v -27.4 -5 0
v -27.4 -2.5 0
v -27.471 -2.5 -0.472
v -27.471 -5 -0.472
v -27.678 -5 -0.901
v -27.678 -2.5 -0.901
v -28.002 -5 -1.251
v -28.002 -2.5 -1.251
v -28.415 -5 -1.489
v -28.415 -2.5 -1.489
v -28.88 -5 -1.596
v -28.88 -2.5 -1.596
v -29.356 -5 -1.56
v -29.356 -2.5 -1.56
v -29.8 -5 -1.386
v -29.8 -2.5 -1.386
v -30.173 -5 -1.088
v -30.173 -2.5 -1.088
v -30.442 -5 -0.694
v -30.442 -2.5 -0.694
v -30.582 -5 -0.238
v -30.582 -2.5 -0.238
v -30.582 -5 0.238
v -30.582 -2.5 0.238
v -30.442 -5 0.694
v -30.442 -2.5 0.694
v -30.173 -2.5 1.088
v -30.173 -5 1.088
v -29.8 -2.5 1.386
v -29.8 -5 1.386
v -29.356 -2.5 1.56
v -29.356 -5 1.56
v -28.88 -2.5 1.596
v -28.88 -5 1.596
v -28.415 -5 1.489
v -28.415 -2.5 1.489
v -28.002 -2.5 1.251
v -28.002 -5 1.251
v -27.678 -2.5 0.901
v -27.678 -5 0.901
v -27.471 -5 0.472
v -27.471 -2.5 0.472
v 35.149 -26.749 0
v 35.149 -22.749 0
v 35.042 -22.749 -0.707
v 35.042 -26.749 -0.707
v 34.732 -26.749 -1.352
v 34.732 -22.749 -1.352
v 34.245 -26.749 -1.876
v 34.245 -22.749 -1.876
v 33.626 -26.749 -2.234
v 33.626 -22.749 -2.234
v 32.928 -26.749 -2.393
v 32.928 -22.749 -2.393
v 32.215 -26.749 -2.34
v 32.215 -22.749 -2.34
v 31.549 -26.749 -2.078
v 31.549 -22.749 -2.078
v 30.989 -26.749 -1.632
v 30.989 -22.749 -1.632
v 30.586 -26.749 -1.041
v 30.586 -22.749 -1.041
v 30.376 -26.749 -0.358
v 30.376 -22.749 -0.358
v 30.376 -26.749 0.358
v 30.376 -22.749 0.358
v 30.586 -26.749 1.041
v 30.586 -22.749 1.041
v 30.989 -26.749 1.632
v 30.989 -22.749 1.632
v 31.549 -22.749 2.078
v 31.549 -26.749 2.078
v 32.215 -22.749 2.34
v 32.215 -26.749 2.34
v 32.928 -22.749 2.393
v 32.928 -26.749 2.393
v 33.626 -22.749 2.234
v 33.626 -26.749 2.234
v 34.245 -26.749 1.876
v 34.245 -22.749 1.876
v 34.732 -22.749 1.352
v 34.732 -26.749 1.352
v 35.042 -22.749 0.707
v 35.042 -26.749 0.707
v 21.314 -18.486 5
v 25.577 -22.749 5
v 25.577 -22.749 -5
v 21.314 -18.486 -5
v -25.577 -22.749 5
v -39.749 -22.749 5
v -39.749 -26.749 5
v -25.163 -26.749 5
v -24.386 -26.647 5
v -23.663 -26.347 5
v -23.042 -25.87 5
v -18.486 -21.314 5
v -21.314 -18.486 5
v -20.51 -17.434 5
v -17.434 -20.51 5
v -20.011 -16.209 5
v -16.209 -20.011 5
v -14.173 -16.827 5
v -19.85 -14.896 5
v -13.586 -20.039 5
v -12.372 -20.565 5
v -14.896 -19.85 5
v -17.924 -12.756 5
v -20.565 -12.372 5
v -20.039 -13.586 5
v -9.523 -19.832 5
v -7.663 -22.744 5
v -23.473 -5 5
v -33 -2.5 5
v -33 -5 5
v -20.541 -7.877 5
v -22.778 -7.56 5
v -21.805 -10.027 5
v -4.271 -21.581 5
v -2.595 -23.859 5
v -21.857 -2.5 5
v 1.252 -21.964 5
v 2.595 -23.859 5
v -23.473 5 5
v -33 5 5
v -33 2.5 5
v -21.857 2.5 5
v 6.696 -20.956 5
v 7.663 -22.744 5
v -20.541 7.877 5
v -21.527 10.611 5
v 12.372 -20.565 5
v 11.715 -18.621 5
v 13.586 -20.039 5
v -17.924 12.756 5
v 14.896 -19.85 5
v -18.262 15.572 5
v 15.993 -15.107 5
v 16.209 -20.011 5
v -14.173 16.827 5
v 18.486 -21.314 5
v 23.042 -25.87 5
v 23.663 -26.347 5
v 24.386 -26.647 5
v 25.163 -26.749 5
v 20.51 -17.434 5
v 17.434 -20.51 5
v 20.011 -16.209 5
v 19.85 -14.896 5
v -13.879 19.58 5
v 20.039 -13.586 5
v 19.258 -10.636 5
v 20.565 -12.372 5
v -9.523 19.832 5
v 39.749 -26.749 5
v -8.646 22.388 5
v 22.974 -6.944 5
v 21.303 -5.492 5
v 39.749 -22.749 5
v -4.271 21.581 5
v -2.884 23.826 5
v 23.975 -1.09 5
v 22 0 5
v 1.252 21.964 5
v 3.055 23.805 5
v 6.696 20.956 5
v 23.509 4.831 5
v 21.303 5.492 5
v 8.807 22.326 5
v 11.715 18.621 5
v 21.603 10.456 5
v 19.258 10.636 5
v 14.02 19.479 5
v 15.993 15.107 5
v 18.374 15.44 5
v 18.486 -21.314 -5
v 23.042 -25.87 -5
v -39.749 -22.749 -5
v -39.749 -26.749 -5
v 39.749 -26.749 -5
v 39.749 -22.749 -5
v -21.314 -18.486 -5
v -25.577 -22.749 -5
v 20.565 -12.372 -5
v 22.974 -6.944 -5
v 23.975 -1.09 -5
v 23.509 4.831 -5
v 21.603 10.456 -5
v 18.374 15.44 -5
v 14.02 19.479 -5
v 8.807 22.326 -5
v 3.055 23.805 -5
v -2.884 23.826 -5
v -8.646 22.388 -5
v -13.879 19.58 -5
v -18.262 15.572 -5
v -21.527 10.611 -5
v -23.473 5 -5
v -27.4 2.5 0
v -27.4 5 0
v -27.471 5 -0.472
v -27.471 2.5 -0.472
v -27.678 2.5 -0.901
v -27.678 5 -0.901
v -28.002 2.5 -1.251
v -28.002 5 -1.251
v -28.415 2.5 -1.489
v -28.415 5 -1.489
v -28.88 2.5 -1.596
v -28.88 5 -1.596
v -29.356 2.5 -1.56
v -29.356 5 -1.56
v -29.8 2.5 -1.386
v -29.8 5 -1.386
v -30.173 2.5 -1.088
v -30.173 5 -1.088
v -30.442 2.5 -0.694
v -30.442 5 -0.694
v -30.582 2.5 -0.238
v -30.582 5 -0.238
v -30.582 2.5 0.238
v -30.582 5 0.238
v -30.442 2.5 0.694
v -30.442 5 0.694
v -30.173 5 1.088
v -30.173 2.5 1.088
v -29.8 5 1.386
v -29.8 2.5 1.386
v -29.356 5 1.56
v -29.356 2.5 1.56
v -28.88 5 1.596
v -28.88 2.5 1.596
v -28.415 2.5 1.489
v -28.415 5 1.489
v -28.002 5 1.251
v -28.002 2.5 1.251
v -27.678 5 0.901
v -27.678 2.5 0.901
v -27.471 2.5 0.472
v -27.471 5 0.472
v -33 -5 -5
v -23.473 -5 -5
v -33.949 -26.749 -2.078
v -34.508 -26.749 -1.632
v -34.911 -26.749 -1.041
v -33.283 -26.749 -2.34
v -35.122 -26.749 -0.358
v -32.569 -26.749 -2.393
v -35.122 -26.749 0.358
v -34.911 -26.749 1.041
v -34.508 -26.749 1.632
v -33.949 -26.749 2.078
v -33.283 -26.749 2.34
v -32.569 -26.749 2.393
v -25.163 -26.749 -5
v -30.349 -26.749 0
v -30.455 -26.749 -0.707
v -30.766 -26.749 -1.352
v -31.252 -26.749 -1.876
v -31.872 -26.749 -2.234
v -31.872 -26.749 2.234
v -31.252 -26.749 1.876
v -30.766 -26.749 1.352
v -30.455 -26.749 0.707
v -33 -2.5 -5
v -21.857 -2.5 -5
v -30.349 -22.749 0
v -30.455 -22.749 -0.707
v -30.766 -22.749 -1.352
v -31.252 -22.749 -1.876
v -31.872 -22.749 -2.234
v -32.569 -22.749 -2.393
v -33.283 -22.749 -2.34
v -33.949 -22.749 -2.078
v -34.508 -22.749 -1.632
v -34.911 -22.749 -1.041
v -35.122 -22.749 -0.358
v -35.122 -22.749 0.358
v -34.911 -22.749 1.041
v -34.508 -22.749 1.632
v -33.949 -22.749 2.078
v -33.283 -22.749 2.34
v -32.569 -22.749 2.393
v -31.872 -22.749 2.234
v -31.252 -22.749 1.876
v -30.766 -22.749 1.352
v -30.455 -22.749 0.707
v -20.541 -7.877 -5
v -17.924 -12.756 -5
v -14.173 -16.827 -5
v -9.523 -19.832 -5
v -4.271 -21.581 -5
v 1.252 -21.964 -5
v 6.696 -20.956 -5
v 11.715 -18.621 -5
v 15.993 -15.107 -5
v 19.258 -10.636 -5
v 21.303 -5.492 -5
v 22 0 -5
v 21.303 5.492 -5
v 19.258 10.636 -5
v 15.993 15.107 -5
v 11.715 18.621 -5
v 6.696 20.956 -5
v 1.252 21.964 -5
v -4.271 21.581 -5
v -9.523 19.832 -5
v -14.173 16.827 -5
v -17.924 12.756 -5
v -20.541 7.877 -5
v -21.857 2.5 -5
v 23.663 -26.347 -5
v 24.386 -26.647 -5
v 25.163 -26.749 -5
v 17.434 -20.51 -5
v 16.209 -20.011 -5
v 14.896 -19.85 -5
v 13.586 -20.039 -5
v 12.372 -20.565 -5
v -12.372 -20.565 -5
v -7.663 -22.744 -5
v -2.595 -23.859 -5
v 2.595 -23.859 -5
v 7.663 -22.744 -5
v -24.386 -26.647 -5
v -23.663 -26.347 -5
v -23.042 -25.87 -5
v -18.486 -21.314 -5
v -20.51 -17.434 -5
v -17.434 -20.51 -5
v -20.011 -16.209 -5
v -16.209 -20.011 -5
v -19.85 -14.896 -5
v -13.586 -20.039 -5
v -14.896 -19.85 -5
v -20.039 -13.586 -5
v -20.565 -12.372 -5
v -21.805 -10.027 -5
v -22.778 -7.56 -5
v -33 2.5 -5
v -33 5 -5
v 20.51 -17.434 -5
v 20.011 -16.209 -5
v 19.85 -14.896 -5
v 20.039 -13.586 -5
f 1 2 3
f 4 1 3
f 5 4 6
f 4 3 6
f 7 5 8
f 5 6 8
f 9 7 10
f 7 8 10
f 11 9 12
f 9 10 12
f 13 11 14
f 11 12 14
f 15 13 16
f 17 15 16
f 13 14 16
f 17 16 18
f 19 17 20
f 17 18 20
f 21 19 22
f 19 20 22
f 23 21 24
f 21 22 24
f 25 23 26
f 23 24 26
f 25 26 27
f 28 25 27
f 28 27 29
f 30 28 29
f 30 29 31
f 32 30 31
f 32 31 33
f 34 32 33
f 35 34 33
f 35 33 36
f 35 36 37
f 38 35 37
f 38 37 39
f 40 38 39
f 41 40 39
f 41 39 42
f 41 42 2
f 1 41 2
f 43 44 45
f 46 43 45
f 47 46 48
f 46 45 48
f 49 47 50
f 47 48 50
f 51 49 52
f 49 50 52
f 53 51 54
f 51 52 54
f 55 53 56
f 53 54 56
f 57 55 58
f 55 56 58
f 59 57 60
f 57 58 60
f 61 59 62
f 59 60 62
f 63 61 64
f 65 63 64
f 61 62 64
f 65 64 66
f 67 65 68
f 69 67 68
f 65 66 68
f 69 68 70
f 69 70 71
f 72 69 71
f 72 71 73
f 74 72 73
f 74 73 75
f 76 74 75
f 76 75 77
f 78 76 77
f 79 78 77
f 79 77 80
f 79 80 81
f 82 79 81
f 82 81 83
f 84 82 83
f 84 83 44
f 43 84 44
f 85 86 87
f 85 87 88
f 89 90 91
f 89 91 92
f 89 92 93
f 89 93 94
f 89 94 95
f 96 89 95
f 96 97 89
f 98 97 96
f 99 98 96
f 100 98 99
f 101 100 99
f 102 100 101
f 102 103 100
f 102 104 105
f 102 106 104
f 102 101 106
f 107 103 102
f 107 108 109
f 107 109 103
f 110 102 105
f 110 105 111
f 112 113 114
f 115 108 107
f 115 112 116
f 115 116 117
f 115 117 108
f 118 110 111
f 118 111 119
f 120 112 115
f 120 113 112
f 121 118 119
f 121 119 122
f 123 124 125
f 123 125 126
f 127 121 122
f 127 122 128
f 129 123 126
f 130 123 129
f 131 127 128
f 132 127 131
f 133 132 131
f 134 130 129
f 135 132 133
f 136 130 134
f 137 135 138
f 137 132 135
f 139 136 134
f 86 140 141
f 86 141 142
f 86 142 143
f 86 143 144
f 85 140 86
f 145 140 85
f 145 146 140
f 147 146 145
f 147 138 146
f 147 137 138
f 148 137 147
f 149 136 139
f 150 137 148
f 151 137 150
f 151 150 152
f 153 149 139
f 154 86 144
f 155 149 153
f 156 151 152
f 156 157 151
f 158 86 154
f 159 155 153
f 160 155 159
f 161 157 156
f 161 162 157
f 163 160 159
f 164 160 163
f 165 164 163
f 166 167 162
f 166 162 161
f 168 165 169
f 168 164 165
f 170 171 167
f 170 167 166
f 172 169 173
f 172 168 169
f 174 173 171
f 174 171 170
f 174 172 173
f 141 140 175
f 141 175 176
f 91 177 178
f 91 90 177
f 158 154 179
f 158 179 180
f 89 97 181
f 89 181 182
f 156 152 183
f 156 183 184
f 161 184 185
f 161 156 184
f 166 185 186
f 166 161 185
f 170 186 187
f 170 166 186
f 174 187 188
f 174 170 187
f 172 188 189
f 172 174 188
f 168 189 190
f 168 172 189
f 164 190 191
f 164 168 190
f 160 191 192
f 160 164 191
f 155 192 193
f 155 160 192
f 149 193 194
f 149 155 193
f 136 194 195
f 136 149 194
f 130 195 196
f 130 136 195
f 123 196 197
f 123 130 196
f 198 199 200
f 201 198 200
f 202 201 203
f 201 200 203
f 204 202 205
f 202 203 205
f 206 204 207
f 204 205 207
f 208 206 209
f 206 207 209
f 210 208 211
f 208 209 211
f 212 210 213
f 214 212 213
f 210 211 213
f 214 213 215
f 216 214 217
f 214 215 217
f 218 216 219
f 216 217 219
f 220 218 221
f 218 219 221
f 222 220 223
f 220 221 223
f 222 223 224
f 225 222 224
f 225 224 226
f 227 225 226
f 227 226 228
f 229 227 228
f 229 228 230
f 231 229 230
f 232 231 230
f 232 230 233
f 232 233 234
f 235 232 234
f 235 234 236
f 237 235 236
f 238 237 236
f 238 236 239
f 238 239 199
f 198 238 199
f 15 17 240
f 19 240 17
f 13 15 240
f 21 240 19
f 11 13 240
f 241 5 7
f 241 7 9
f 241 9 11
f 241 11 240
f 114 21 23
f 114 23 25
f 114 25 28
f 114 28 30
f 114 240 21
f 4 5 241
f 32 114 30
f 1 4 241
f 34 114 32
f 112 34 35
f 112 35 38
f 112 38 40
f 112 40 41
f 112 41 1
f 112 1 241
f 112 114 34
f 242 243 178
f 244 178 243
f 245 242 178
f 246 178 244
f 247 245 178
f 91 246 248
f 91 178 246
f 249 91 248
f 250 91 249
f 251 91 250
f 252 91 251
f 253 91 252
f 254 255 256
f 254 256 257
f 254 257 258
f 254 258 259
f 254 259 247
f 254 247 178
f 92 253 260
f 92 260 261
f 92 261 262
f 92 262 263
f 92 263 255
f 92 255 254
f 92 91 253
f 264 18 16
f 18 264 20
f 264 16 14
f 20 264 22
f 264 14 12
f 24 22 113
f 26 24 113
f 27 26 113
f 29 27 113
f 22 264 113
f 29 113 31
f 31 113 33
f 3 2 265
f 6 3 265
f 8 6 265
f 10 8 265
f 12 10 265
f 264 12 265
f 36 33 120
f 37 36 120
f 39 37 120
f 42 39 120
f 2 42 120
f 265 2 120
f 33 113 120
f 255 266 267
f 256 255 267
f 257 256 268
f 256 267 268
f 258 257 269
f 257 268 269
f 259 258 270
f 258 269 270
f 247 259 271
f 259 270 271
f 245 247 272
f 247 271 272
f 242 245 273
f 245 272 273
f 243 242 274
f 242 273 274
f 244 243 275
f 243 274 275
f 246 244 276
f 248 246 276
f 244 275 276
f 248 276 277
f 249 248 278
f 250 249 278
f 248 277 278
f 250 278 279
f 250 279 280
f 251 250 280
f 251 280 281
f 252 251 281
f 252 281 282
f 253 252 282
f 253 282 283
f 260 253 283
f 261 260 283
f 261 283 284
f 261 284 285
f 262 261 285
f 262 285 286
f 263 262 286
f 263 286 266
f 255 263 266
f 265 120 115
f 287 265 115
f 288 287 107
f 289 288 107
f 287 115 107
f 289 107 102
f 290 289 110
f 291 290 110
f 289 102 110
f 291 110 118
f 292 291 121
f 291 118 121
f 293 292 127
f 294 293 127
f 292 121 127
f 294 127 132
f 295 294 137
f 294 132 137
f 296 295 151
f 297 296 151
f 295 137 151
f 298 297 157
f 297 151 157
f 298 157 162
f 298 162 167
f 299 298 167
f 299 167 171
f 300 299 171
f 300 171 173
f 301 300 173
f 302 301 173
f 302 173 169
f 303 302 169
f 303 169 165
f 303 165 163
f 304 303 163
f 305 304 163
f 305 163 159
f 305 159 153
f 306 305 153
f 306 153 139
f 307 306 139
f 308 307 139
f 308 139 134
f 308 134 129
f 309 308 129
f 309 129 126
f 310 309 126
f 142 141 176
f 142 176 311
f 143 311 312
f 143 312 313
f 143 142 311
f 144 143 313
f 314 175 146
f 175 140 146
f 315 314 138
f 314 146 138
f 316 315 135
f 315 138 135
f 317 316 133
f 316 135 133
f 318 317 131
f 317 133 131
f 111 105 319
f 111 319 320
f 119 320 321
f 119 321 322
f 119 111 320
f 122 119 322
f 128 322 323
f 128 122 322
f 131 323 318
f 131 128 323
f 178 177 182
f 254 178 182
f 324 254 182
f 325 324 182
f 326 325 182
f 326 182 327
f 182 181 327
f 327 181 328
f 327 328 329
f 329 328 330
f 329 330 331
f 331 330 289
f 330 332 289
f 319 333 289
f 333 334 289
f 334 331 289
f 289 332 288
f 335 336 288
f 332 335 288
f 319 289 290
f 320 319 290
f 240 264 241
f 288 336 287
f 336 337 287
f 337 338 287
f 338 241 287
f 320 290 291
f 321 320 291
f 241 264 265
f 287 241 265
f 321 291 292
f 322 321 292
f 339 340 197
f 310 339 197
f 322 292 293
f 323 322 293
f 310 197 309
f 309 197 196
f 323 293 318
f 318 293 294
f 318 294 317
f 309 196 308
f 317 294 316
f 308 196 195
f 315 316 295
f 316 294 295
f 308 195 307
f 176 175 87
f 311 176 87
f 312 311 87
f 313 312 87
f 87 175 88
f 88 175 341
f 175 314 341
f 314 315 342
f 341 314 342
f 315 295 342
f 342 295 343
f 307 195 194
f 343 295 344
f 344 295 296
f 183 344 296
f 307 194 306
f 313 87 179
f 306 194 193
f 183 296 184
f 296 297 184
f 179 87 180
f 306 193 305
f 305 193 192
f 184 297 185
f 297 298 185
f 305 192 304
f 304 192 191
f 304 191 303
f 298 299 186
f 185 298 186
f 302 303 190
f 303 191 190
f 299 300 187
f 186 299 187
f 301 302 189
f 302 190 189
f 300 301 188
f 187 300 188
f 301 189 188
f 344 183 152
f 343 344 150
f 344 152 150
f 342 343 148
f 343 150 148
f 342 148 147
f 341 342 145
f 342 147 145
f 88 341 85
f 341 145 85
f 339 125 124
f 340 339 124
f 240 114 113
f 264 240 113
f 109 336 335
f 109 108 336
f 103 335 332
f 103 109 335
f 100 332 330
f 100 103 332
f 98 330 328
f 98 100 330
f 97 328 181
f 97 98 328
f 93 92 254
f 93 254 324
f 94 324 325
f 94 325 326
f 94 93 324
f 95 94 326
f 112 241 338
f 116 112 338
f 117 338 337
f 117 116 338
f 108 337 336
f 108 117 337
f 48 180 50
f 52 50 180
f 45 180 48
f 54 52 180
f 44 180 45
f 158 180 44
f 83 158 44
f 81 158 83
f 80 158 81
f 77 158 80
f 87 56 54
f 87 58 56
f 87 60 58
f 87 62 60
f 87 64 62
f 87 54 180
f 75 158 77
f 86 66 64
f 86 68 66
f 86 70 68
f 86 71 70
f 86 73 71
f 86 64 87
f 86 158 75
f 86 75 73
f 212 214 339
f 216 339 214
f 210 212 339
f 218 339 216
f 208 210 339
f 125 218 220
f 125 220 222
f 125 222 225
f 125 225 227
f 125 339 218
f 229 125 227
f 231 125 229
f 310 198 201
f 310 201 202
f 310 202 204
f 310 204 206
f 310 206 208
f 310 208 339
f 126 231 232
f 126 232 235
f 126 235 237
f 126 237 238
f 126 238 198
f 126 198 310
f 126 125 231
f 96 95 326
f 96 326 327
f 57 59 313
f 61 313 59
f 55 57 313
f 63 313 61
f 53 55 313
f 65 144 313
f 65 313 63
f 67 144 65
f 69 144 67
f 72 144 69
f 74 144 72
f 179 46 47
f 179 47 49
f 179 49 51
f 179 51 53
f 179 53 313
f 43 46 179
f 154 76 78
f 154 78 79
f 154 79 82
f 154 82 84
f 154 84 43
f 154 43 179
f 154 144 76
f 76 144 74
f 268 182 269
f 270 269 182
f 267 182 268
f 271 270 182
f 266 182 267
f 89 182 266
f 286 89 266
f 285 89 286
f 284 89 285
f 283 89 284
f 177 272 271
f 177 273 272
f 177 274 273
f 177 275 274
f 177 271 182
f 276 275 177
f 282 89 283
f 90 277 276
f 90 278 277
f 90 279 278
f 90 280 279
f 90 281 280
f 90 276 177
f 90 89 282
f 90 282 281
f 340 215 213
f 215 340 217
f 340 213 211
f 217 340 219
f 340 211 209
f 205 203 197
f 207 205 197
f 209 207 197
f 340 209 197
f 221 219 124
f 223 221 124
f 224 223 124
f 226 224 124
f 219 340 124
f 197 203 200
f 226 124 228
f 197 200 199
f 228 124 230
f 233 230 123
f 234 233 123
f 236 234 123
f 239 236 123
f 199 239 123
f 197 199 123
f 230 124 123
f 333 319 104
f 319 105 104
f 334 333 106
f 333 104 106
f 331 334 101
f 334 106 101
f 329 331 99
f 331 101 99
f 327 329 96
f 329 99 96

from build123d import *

# Parameters (mm, degrees)
SKETCH1_R               = 24
BOSS_EXTRUDE1_DEPTH     = 5
EXTRUDE_THIN1_DEPTH     = 5
SKETCH4_W               = 33
SKETCH4_H               = 10
BOSS_EXTRUDE2_DEPTH     = 5
SKETCH5_R               = 22
SKETCH5_W               = 33
SKETCH5_H               = 5
CUT_EXTRUDE1_DEPTH      = 26.5
SKETCH6_R               = 1.6
CUT_EXTRUDE2_DEPTH      = 20
CUT_EXTRUDE2_DEPTH_BACK = 10
SKETCH7_R               = 2.4
CUT_EXTRUDE3_DEPTH      = 5
FILLET3_R               = 5


with BuildPart() as part:
    # Sketch1 → Boss-Extrude1 (new body, symmetric)
    with BuildSketch(Plane.XY):
        Circle(SKETCH1_R)
    extrude(amount=BOSS_EXTRUDE1_DEPTH, both=True)

    # Sketch2 → Extrude-Thin1 (add, symmetric)
    with BuildSketch(Plane.XY):
        with BuildLine():
            Line((-39.748737342, -26.748737342), (-25.162950904, -26.748737342))
            ThreePointArc((-25.162950904, -26.748737342), (-24.014900607, -26.520375939), (-23.04163056, -25.870057685))
            Line((-23.04163056, -25.870057685), (0, -2.828427125))
            Line((0, -2.828427125), (23.04163056, -25.870057685))
            ThreePointArc((23.04163056, -25.870057685), (24.014900607, -26.520375939), (25.162950904, -26.748737342))
            Line((25.162950904, -26.748737342), (39.748737342, -26.748737342))
            Line((39.748737342, -26.748737342), (39.748737342, -22.748737342))
            Line((39.748737342, -22.748737342), (25.577164466, -22.748737342))
            Line((25.577164466, -22.748737342), (0, 2.828427125))
            Line((0, 2.828427125), (-25.577164466, -22.748737342))
            Line((-25.577164466, -22.748737342), (-39.748737342, -22.748737342))
            Line((-39.748737342, -22.748737342), (-39.748737342, -26.748737342))
        make_face()
    extrude(amount=EXTRUDE_THIN1_DEPTH, both=True)

    # Sketch4 → Boss-Extrude2 (add, symmetric)
    with BuildSketch(Plane.XY):
        with Locations((-16.5, 0)):
            Rectangle(SKETCH4_W, SKETCH4_H)
    extrude(amount=BOSS_EXTRUDE2_DEPTH, both=True)

    # Sketch5 → Cut-Extrude1 (cut)
    with BuildSketch(Plane.XY.offset(5)):
        Circle(SKETCH5_R)
        with Locations((-16.5, 0)):
            Rectangle(SKETCH5_W, SKETCH5_H)
    extrude(amount=-CUT_EXTRUDE1_DEPTH, mode=Mode.SUBTRACT)

    # Sketch6 → Cut-Extrude2 (cut, two sides)
    with BuildSketch(Plane(origin=(0, 5, 0), x_dir=(1, 0, 0), z_dir=(0, 1, 0))) as cut_extrude2_sk:
        with Locations((-29, 0)):
            Circle(SKETCH6_R)
    extrude(amount=CUT_EXTRUDE2_DEPTH, mode=Mode.SUBTRACT)
    extrude(cut_extrude2_sk.sketch, amount=-CUT_EXTRUDE2_DEPTH_BACK, mode=Mode.SUBTRACT)

    # Sketch7 → Cut-Extrude3 (cut, through all)
    with BuildSketch(Plane(origin=(0, -22.748737342, 0), x_dir=(1, 0, 0), z_dir=(0, 1, 0))):
        with Locations((-32.748737342, 0)):
            Circle(SKETCH7_R)
        with Locations((32.748737342, 0)):
            Circle(SKETCH7_R)
    extrude(amount=-CUT_EXTRUDE3_DEPTH, mode=Mode.SUBTRACT)

    # Fillet3
    fillet3_edges = [part.edges().sort_by_distance(p)[0] for p in [
        (-15.497320963, -18.325748088, 0),
        (15.497320963, -18.325748088, 0),
        (18.325748088, -15.497320963, 0),
        (-18.325748088, -15.497320963, 0),
    ]]
    fillet(fillet3_edges, radius=FILLET3_R)


solid = part.part
